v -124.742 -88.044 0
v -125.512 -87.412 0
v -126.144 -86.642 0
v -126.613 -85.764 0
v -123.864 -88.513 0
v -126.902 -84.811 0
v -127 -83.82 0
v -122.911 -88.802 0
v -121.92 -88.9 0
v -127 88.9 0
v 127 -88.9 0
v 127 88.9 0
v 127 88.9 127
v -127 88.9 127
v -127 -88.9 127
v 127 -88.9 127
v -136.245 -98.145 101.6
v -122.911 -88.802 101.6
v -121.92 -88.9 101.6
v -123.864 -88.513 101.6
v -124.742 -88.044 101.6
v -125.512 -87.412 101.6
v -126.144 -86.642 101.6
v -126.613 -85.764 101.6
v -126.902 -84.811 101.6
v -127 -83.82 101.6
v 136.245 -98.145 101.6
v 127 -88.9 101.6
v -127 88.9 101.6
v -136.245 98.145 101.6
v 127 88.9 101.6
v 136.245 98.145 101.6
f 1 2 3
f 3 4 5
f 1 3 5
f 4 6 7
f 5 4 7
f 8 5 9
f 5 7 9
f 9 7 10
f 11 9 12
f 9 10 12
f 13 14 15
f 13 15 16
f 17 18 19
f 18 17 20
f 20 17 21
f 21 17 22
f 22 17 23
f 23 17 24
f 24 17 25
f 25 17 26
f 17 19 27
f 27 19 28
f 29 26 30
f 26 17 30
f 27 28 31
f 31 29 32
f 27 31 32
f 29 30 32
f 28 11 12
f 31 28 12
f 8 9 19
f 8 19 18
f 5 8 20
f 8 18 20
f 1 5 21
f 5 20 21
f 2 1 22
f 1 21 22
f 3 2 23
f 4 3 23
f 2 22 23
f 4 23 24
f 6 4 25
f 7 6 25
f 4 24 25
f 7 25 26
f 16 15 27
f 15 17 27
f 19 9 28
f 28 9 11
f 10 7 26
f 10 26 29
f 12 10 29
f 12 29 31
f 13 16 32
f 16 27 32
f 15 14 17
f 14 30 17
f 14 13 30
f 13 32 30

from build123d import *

# Parameters (mm, degrees)
F0_W      = 254
F0_H      = 177.8
F1_DEPTH  = 127
F1_FACE_W = 254
F1_FACE_H = 177.8
F2_DEPTH  = 25.4
F2_TAPER  = -20
F3_R      = 5.08


with BuildPart() as f1:
    # F0 (on Top) → F1 (new body)
    with BuildSketch(Plane.XY):
        Rectangle(F0_W, F0_H)
    extrude(amount=F1_DEPTH)

    # F1_face (on face) → F2 (join)
    with BuildSketch(Plane.XY.offset(127)):
        Rectangle(F1_FACE_W, F1_FACE_H)
    extrude(amount=-F2_DEPTH, taper=F2_TAPER)

    # F3
    f3_edges = [f1.edges().sort_by_distance(p)[0] for p in [
        (-127, -88.9, 50.8),
    ]]
    fillet(f3_edges, radius=F3_R)


solid = f1.part
